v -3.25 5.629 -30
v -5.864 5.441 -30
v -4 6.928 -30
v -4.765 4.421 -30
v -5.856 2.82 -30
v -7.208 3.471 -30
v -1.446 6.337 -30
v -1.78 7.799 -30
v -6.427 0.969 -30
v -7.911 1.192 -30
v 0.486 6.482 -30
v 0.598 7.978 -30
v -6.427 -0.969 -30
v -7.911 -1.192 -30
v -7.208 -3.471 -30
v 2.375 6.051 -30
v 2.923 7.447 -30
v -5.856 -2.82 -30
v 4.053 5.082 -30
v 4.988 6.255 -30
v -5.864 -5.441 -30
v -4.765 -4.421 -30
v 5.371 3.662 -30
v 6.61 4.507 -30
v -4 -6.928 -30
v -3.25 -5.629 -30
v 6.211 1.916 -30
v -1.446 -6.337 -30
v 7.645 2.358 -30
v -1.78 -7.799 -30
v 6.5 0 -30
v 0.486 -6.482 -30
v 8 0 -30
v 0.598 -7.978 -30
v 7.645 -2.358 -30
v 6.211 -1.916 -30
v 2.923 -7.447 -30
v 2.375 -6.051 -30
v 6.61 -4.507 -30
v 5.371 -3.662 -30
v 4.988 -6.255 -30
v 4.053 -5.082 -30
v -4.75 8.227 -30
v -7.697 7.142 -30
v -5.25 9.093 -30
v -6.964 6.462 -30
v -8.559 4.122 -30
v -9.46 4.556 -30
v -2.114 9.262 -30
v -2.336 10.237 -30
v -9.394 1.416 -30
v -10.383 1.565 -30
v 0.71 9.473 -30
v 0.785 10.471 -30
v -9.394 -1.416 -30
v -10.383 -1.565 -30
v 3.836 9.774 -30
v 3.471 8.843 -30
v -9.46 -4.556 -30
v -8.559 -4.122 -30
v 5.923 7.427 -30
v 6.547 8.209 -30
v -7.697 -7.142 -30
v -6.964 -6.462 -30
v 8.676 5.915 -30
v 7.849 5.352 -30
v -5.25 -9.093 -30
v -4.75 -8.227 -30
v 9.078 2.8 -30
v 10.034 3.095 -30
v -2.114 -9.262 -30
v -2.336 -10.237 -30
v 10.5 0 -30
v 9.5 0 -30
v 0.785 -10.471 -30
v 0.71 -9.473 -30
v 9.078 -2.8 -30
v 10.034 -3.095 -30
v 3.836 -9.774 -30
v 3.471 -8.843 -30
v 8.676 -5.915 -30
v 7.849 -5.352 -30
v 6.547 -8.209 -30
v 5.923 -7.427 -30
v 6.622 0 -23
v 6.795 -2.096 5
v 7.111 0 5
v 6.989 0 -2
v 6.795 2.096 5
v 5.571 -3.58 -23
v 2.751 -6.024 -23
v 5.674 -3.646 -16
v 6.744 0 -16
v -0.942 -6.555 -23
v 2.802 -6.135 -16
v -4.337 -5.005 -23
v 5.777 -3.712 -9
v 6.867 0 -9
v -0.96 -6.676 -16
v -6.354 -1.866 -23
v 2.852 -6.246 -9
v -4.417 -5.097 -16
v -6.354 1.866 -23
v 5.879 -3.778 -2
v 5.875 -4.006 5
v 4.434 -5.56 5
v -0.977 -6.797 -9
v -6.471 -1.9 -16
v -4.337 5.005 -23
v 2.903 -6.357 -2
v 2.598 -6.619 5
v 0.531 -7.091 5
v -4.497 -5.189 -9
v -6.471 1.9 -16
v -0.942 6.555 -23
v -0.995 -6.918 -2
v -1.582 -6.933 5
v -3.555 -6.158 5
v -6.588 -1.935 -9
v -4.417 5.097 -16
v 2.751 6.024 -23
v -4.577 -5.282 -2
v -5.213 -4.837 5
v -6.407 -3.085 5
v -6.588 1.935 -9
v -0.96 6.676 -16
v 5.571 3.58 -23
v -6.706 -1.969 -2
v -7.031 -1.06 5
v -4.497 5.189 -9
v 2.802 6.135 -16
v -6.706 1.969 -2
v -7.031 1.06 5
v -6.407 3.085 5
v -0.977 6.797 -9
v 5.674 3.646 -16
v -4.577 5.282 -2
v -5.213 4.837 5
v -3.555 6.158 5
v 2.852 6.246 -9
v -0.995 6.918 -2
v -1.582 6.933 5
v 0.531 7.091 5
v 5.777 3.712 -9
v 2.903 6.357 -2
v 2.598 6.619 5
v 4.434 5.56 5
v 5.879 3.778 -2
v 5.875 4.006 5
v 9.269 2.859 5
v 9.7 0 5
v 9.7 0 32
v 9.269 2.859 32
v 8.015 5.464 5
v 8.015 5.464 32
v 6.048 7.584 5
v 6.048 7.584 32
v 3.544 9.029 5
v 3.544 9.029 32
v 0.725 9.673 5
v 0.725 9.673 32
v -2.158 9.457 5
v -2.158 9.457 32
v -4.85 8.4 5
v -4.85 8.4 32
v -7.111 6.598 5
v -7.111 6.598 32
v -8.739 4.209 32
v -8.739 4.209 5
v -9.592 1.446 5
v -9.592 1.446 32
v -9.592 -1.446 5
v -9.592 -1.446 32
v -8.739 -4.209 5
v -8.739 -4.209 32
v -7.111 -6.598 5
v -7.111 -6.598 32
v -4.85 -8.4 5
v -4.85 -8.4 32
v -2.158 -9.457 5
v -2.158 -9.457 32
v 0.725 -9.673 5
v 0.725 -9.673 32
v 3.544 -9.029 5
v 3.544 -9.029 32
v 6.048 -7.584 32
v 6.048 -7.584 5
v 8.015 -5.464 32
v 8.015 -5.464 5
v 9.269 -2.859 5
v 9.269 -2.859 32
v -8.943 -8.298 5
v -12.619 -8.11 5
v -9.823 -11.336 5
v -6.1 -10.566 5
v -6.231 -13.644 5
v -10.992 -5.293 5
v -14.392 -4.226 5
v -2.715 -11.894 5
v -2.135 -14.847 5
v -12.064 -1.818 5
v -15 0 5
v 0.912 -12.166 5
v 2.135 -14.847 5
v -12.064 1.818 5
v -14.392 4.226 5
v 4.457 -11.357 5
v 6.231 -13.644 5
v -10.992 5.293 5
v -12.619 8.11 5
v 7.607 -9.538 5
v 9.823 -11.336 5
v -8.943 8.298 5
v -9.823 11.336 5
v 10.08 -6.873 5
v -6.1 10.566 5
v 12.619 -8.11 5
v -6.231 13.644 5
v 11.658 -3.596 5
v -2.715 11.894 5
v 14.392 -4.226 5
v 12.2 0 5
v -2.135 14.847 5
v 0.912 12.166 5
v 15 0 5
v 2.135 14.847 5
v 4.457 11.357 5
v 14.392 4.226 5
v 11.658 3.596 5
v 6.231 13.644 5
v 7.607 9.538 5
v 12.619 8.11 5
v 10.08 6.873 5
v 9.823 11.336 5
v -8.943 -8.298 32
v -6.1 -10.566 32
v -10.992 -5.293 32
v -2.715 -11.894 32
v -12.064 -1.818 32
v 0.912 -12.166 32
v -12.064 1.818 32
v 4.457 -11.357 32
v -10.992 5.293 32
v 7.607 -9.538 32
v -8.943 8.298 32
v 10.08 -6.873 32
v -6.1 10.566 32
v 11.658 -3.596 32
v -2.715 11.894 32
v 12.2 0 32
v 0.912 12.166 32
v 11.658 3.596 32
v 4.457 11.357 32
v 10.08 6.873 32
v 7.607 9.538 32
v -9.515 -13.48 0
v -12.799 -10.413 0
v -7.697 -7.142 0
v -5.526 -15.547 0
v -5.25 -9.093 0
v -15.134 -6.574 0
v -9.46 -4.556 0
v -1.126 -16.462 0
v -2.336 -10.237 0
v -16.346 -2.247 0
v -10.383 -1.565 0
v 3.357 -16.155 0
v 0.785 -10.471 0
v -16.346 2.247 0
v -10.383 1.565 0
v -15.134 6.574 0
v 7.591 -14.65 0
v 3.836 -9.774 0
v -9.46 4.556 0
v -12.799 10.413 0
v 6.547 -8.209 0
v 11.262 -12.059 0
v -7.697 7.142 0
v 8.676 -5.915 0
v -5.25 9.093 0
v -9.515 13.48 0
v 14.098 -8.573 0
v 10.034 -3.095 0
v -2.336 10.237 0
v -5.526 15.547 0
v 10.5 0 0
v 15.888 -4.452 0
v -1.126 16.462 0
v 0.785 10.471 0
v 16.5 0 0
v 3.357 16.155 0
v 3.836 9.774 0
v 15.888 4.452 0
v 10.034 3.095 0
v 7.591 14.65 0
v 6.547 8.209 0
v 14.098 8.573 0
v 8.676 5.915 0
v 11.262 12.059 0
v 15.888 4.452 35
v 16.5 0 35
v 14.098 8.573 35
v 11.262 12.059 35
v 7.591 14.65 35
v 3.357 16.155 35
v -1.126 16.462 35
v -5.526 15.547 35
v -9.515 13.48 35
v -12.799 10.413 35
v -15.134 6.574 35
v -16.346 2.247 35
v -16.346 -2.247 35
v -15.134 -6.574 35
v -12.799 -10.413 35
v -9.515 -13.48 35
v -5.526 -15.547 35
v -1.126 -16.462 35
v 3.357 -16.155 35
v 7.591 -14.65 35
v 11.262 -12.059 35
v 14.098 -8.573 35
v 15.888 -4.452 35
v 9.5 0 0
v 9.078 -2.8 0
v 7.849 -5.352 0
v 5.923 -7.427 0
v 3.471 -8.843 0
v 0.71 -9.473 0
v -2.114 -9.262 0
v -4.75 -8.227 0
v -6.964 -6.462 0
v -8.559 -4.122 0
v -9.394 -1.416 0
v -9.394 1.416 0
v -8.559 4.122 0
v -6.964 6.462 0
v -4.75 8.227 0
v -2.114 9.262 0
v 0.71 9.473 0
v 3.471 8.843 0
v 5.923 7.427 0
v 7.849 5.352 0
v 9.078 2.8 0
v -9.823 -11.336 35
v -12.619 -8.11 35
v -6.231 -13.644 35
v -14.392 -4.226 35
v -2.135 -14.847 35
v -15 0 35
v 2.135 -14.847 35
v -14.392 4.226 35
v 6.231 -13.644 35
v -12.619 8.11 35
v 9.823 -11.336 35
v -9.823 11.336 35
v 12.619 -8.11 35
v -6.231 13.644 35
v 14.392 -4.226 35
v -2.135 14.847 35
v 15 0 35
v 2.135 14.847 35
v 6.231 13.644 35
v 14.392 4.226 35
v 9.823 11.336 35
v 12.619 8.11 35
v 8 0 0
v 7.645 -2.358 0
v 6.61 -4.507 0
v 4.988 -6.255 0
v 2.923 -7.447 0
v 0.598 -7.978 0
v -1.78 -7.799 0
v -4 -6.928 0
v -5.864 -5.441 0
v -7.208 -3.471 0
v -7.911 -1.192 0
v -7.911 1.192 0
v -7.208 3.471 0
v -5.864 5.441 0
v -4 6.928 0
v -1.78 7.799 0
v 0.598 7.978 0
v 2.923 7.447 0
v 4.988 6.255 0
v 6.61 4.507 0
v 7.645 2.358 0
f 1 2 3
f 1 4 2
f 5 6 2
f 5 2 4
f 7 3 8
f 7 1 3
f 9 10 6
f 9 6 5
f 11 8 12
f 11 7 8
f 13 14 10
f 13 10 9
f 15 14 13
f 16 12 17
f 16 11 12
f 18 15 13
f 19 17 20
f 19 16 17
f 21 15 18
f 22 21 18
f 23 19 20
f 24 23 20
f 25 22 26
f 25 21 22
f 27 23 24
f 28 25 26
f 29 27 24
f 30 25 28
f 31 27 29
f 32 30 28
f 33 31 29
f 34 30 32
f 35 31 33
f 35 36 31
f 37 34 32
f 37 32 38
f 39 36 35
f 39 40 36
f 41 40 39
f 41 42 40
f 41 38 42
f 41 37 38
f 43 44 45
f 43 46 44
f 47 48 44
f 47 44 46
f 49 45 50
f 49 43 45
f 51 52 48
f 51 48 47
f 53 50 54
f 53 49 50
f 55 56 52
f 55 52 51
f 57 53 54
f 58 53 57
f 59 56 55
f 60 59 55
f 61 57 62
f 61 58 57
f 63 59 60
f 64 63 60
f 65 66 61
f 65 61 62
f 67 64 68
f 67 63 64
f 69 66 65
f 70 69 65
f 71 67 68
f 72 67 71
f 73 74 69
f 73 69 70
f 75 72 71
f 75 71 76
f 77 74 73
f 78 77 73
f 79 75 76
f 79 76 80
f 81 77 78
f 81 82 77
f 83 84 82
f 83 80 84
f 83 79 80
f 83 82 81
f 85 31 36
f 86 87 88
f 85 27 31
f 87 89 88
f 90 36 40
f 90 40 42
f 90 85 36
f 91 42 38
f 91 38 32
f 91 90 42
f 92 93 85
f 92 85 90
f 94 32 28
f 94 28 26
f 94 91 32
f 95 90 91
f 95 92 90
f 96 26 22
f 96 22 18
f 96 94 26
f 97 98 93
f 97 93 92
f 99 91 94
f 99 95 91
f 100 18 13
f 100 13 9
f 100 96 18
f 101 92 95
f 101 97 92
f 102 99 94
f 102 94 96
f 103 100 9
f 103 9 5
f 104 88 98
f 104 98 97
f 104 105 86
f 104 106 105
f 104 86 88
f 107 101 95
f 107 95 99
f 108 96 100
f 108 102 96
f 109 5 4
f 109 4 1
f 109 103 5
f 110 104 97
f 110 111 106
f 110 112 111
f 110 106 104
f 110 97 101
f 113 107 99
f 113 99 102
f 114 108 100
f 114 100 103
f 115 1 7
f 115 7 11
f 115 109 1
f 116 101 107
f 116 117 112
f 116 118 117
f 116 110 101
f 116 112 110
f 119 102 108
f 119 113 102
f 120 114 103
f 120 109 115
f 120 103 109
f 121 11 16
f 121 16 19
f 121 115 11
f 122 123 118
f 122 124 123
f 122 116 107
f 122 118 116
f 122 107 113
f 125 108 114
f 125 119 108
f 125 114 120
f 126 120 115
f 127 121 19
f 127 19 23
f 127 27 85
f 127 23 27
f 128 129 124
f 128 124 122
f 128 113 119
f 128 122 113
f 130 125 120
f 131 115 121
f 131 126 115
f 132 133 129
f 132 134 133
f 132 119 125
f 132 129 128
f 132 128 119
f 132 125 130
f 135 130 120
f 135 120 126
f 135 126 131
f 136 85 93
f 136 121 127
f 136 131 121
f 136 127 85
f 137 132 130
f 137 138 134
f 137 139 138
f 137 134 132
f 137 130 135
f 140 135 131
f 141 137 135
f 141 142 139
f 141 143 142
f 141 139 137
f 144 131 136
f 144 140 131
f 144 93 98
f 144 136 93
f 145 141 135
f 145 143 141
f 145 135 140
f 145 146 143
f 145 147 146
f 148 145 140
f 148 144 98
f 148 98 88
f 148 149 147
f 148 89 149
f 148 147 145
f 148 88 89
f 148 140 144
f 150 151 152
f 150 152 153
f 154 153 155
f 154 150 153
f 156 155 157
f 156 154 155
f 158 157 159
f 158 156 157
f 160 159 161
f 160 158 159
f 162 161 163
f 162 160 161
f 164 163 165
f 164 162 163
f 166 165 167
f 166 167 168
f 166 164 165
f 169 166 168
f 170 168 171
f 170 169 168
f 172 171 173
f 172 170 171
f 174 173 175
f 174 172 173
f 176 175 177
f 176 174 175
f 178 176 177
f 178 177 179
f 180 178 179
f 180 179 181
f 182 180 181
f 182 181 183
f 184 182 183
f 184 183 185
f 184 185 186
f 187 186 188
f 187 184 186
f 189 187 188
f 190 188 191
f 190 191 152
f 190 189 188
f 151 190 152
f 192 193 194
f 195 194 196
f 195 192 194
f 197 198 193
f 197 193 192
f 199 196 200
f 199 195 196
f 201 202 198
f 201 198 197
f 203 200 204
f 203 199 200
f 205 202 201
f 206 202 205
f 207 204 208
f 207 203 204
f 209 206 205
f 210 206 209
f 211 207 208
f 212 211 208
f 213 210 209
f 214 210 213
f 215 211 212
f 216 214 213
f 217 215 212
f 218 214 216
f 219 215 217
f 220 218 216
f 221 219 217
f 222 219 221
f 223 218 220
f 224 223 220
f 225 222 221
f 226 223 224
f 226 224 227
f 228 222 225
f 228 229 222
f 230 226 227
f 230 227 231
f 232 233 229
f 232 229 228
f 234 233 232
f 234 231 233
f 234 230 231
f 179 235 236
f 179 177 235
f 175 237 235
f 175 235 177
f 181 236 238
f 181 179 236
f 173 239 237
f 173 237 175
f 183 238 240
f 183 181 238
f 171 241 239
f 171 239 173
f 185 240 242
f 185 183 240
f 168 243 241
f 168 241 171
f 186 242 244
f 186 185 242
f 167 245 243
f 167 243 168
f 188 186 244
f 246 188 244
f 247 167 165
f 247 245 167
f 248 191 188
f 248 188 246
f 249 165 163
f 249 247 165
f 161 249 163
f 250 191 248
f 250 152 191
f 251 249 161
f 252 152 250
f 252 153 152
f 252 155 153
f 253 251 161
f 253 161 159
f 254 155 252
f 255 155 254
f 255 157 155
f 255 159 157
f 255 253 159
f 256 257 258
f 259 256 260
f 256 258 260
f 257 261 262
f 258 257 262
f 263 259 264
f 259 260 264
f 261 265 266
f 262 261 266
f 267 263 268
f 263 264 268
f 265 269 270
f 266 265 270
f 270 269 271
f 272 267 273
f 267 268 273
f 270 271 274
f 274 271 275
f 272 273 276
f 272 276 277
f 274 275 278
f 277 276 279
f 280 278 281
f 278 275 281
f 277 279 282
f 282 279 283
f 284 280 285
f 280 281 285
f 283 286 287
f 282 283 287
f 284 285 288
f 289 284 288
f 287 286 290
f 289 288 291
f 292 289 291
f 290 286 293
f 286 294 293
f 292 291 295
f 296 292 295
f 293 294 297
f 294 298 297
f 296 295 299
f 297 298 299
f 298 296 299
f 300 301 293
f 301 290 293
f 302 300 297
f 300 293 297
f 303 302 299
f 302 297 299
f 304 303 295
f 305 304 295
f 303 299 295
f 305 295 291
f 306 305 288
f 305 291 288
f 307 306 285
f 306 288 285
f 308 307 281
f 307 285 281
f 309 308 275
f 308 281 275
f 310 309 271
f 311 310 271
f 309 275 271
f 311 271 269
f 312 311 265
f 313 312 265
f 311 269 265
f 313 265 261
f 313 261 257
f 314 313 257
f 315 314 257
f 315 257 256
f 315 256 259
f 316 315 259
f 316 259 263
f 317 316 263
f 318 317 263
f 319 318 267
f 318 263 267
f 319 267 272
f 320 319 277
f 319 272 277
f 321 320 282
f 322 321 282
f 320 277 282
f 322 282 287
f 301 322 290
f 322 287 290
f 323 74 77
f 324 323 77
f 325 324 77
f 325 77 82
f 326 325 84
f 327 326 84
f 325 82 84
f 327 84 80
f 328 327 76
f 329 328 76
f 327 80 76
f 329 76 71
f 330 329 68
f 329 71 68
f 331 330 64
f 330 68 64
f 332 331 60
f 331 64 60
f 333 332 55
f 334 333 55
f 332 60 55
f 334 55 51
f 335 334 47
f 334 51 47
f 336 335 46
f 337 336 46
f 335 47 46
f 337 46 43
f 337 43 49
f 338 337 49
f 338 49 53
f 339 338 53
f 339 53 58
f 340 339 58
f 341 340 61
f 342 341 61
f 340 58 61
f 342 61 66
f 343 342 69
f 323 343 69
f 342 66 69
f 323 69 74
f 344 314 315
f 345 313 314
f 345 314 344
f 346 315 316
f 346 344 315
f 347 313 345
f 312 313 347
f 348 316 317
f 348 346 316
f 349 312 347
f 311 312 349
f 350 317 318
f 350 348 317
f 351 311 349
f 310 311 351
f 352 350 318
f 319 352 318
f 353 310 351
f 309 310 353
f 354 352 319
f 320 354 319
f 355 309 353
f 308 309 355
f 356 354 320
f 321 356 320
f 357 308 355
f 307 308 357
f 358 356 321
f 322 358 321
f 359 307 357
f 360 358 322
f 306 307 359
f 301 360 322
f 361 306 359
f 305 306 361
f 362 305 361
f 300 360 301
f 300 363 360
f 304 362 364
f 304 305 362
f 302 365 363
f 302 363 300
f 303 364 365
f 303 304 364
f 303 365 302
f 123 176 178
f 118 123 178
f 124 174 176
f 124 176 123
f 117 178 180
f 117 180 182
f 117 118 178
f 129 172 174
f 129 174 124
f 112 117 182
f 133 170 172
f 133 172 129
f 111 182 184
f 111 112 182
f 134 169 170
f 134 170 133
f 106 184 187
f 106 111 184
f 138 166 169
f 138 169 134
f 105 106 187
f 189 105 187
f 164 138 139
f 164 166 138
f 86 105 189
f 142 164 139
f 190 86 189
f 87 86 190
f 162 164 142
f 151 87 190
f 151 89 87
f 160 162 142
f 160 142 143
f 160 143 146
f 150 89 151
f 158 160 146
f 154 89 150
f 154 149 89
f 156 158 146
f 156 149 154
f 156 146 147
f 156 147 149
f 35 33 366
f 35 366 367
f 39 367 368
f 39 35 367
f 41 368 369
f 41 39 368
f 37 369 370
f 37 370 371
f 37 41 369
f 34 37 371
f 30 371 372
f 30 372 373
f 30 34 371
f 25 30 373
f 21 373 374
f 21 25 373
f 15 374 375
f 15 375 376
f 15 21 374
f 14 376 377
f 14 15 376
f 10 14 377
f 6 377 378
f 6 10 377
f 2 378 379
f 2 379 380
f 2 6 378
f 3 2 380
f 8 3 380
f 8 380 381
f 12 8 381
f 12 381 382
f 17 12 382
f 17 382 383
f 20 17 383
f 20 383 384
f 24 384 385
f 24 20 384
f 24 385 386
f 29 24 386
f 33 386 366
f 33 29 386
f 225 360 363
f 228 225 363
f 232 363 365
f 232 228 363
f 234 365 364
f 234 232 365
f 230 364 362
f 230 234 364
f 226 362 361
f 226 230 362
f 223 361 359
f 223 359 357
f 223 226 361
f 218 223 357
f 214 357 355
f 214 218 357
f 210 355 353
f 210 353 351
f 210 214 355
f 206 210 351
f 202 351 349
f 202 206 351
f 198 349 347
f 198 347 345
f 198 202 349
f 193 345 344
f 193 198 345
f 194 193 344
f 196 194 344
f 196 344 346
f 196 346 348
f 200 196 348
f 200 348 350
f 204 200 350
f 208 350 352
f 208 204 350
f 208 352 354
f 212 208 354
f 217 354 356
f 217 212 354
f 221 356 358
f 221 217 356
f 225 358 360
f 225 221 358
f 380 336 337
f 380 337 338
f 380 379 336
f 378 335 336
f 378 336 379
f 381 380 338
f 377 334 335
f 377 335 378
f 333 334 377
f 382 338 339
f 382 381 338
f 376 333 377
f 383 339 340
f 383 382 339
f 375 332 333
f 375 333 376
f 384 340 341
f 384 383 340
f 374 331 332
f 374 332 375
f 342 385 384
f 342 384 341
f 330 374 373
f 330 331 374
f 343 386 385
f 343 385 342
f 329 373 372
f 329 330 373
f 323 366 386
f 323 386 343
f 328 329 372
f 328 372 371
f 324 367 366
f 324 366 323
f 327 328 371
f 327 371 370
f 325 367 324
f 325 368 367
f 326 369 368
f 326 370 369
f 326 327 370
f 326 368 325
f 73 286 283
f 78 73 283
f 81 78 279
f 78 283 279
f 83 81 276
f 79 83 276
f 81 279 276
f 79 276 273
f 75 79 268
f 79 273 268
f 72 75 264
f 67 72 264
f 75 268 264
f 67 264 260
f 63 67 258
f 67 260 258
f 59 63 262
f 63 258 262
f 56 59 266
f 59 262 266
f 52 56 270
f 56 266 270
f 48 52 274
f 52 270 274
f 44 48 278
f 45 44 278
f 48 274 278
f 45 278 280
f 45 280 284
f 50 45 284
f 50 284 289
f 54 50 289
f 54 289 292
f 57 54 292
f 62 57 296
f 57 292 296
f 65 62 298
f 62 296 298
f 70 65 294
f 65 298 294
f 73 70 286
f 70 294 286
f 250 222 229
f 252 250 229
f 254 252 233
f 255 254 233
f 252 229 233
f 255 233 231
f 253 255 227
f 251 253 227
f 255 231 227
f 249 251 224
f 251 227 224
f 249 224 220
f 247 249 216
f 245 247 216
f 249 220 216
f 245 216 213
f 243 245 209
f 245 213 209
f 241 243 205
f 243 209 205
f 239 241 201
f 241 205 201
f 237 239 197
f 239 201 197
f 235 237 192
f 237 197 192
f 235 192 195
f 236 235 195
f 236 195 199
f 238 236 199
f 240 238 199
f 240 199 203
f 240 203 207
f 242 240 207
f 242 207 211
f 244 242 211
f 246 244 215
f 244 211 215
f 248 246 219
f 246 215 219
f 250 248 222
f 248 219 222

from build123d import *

# Parameters (mm, degrees)
F0_R      = 16.5
F1_DEPTH  = 5
F2_R      = 16.5
F2_R_2    = 15
F3_DEPTH  = 30
F4_R      = 12.2
F4_R_2    = 9.7
F5_DEPTH  = 27
F6_R      = 10.5
F7_DEPTH  = 30
F8_R      = 9.5
F8_R_2    = 8
F8_R_3    = 6.5
F9_DEPTH  = 30
F10_DEPTH = 30
F11_SIZE2 = 0.610917
F11_SIZE  = 34.99999


# Not quite as in the source:
# - a fillet or chamfer is up to 0.001 mm smaller than in the source, because OpenCascade refuses the exact size


with BuildPart() as f1:
    # F0 (on Top) → F1 (new body)
    with BuildSketch(Plane.XY):
        Circle(F0_R)
    extrude(amount=F1_DEPTH)

    # F2 (on face) → F3 (join)
    with BuildSketch(Plane.XY.offset(5)):
        Circle(F2_R)
        Circle(F2_R_2, mode=Mode.SUBTRACT)
    extrude(amount=F3_DEPTH)

    # F4 (on face) → F5 (join)
    with BuildSketch(Plane.XY.offset(5)):
        Circle(F4_R)
        Circle(F4_R_2, mode=Mode.SUBTRACT)
    extrude(amount=F5_DEPTH)

    # F6 (on face) → F7 (join)
    with BuildSketch(Plane(origin=(0, 0, 0), x_dir=(1, 0, 0), z_dir=(0, 0, -1))):
        Circle(F6_R)
    extrude(amount=F7_DEPTH)

    # F8 (on face) → F9 (cut)
    with BuildSketch(Plane(origin=(0, 0, -30), x_dir=(1, 0, 0), z_dir=(0, 0, -1))):
        Circle(F8_R)
        Circle(F8_R_2, mode=Mode.SUBTRACT)
        Circle(F8_R_3)
    extrude(amount=-F9_DEPTH, mode=Mode.SUBTRACT)

    # F10 (cut): a face of the model
    f10_faces = [f1.faces().sort_by_distance(p)[0] for p in [
        (0, 0, 0),
    ]]
    extrude(f10_faces, amount=-F10_DEPTH, mode=Mode.SUBTRACT)

    # F11 (size 35 and 0.6109272725 in the source; OpenCascade refuses exactly that, so slightly less here)
    f11_edges = [f1.edges().sort_by_distance(p)[0] for p in [
        (-6.5, 0, 5),
    ]]
    f11_side = f1.faces().sort_by_distance((-6.5, 0, -12.5))[0]
    chamfer(f11_edges, length=F11_SIZE, length2=F11_SIZE2, reference=f11_side)


solid = f1.part
